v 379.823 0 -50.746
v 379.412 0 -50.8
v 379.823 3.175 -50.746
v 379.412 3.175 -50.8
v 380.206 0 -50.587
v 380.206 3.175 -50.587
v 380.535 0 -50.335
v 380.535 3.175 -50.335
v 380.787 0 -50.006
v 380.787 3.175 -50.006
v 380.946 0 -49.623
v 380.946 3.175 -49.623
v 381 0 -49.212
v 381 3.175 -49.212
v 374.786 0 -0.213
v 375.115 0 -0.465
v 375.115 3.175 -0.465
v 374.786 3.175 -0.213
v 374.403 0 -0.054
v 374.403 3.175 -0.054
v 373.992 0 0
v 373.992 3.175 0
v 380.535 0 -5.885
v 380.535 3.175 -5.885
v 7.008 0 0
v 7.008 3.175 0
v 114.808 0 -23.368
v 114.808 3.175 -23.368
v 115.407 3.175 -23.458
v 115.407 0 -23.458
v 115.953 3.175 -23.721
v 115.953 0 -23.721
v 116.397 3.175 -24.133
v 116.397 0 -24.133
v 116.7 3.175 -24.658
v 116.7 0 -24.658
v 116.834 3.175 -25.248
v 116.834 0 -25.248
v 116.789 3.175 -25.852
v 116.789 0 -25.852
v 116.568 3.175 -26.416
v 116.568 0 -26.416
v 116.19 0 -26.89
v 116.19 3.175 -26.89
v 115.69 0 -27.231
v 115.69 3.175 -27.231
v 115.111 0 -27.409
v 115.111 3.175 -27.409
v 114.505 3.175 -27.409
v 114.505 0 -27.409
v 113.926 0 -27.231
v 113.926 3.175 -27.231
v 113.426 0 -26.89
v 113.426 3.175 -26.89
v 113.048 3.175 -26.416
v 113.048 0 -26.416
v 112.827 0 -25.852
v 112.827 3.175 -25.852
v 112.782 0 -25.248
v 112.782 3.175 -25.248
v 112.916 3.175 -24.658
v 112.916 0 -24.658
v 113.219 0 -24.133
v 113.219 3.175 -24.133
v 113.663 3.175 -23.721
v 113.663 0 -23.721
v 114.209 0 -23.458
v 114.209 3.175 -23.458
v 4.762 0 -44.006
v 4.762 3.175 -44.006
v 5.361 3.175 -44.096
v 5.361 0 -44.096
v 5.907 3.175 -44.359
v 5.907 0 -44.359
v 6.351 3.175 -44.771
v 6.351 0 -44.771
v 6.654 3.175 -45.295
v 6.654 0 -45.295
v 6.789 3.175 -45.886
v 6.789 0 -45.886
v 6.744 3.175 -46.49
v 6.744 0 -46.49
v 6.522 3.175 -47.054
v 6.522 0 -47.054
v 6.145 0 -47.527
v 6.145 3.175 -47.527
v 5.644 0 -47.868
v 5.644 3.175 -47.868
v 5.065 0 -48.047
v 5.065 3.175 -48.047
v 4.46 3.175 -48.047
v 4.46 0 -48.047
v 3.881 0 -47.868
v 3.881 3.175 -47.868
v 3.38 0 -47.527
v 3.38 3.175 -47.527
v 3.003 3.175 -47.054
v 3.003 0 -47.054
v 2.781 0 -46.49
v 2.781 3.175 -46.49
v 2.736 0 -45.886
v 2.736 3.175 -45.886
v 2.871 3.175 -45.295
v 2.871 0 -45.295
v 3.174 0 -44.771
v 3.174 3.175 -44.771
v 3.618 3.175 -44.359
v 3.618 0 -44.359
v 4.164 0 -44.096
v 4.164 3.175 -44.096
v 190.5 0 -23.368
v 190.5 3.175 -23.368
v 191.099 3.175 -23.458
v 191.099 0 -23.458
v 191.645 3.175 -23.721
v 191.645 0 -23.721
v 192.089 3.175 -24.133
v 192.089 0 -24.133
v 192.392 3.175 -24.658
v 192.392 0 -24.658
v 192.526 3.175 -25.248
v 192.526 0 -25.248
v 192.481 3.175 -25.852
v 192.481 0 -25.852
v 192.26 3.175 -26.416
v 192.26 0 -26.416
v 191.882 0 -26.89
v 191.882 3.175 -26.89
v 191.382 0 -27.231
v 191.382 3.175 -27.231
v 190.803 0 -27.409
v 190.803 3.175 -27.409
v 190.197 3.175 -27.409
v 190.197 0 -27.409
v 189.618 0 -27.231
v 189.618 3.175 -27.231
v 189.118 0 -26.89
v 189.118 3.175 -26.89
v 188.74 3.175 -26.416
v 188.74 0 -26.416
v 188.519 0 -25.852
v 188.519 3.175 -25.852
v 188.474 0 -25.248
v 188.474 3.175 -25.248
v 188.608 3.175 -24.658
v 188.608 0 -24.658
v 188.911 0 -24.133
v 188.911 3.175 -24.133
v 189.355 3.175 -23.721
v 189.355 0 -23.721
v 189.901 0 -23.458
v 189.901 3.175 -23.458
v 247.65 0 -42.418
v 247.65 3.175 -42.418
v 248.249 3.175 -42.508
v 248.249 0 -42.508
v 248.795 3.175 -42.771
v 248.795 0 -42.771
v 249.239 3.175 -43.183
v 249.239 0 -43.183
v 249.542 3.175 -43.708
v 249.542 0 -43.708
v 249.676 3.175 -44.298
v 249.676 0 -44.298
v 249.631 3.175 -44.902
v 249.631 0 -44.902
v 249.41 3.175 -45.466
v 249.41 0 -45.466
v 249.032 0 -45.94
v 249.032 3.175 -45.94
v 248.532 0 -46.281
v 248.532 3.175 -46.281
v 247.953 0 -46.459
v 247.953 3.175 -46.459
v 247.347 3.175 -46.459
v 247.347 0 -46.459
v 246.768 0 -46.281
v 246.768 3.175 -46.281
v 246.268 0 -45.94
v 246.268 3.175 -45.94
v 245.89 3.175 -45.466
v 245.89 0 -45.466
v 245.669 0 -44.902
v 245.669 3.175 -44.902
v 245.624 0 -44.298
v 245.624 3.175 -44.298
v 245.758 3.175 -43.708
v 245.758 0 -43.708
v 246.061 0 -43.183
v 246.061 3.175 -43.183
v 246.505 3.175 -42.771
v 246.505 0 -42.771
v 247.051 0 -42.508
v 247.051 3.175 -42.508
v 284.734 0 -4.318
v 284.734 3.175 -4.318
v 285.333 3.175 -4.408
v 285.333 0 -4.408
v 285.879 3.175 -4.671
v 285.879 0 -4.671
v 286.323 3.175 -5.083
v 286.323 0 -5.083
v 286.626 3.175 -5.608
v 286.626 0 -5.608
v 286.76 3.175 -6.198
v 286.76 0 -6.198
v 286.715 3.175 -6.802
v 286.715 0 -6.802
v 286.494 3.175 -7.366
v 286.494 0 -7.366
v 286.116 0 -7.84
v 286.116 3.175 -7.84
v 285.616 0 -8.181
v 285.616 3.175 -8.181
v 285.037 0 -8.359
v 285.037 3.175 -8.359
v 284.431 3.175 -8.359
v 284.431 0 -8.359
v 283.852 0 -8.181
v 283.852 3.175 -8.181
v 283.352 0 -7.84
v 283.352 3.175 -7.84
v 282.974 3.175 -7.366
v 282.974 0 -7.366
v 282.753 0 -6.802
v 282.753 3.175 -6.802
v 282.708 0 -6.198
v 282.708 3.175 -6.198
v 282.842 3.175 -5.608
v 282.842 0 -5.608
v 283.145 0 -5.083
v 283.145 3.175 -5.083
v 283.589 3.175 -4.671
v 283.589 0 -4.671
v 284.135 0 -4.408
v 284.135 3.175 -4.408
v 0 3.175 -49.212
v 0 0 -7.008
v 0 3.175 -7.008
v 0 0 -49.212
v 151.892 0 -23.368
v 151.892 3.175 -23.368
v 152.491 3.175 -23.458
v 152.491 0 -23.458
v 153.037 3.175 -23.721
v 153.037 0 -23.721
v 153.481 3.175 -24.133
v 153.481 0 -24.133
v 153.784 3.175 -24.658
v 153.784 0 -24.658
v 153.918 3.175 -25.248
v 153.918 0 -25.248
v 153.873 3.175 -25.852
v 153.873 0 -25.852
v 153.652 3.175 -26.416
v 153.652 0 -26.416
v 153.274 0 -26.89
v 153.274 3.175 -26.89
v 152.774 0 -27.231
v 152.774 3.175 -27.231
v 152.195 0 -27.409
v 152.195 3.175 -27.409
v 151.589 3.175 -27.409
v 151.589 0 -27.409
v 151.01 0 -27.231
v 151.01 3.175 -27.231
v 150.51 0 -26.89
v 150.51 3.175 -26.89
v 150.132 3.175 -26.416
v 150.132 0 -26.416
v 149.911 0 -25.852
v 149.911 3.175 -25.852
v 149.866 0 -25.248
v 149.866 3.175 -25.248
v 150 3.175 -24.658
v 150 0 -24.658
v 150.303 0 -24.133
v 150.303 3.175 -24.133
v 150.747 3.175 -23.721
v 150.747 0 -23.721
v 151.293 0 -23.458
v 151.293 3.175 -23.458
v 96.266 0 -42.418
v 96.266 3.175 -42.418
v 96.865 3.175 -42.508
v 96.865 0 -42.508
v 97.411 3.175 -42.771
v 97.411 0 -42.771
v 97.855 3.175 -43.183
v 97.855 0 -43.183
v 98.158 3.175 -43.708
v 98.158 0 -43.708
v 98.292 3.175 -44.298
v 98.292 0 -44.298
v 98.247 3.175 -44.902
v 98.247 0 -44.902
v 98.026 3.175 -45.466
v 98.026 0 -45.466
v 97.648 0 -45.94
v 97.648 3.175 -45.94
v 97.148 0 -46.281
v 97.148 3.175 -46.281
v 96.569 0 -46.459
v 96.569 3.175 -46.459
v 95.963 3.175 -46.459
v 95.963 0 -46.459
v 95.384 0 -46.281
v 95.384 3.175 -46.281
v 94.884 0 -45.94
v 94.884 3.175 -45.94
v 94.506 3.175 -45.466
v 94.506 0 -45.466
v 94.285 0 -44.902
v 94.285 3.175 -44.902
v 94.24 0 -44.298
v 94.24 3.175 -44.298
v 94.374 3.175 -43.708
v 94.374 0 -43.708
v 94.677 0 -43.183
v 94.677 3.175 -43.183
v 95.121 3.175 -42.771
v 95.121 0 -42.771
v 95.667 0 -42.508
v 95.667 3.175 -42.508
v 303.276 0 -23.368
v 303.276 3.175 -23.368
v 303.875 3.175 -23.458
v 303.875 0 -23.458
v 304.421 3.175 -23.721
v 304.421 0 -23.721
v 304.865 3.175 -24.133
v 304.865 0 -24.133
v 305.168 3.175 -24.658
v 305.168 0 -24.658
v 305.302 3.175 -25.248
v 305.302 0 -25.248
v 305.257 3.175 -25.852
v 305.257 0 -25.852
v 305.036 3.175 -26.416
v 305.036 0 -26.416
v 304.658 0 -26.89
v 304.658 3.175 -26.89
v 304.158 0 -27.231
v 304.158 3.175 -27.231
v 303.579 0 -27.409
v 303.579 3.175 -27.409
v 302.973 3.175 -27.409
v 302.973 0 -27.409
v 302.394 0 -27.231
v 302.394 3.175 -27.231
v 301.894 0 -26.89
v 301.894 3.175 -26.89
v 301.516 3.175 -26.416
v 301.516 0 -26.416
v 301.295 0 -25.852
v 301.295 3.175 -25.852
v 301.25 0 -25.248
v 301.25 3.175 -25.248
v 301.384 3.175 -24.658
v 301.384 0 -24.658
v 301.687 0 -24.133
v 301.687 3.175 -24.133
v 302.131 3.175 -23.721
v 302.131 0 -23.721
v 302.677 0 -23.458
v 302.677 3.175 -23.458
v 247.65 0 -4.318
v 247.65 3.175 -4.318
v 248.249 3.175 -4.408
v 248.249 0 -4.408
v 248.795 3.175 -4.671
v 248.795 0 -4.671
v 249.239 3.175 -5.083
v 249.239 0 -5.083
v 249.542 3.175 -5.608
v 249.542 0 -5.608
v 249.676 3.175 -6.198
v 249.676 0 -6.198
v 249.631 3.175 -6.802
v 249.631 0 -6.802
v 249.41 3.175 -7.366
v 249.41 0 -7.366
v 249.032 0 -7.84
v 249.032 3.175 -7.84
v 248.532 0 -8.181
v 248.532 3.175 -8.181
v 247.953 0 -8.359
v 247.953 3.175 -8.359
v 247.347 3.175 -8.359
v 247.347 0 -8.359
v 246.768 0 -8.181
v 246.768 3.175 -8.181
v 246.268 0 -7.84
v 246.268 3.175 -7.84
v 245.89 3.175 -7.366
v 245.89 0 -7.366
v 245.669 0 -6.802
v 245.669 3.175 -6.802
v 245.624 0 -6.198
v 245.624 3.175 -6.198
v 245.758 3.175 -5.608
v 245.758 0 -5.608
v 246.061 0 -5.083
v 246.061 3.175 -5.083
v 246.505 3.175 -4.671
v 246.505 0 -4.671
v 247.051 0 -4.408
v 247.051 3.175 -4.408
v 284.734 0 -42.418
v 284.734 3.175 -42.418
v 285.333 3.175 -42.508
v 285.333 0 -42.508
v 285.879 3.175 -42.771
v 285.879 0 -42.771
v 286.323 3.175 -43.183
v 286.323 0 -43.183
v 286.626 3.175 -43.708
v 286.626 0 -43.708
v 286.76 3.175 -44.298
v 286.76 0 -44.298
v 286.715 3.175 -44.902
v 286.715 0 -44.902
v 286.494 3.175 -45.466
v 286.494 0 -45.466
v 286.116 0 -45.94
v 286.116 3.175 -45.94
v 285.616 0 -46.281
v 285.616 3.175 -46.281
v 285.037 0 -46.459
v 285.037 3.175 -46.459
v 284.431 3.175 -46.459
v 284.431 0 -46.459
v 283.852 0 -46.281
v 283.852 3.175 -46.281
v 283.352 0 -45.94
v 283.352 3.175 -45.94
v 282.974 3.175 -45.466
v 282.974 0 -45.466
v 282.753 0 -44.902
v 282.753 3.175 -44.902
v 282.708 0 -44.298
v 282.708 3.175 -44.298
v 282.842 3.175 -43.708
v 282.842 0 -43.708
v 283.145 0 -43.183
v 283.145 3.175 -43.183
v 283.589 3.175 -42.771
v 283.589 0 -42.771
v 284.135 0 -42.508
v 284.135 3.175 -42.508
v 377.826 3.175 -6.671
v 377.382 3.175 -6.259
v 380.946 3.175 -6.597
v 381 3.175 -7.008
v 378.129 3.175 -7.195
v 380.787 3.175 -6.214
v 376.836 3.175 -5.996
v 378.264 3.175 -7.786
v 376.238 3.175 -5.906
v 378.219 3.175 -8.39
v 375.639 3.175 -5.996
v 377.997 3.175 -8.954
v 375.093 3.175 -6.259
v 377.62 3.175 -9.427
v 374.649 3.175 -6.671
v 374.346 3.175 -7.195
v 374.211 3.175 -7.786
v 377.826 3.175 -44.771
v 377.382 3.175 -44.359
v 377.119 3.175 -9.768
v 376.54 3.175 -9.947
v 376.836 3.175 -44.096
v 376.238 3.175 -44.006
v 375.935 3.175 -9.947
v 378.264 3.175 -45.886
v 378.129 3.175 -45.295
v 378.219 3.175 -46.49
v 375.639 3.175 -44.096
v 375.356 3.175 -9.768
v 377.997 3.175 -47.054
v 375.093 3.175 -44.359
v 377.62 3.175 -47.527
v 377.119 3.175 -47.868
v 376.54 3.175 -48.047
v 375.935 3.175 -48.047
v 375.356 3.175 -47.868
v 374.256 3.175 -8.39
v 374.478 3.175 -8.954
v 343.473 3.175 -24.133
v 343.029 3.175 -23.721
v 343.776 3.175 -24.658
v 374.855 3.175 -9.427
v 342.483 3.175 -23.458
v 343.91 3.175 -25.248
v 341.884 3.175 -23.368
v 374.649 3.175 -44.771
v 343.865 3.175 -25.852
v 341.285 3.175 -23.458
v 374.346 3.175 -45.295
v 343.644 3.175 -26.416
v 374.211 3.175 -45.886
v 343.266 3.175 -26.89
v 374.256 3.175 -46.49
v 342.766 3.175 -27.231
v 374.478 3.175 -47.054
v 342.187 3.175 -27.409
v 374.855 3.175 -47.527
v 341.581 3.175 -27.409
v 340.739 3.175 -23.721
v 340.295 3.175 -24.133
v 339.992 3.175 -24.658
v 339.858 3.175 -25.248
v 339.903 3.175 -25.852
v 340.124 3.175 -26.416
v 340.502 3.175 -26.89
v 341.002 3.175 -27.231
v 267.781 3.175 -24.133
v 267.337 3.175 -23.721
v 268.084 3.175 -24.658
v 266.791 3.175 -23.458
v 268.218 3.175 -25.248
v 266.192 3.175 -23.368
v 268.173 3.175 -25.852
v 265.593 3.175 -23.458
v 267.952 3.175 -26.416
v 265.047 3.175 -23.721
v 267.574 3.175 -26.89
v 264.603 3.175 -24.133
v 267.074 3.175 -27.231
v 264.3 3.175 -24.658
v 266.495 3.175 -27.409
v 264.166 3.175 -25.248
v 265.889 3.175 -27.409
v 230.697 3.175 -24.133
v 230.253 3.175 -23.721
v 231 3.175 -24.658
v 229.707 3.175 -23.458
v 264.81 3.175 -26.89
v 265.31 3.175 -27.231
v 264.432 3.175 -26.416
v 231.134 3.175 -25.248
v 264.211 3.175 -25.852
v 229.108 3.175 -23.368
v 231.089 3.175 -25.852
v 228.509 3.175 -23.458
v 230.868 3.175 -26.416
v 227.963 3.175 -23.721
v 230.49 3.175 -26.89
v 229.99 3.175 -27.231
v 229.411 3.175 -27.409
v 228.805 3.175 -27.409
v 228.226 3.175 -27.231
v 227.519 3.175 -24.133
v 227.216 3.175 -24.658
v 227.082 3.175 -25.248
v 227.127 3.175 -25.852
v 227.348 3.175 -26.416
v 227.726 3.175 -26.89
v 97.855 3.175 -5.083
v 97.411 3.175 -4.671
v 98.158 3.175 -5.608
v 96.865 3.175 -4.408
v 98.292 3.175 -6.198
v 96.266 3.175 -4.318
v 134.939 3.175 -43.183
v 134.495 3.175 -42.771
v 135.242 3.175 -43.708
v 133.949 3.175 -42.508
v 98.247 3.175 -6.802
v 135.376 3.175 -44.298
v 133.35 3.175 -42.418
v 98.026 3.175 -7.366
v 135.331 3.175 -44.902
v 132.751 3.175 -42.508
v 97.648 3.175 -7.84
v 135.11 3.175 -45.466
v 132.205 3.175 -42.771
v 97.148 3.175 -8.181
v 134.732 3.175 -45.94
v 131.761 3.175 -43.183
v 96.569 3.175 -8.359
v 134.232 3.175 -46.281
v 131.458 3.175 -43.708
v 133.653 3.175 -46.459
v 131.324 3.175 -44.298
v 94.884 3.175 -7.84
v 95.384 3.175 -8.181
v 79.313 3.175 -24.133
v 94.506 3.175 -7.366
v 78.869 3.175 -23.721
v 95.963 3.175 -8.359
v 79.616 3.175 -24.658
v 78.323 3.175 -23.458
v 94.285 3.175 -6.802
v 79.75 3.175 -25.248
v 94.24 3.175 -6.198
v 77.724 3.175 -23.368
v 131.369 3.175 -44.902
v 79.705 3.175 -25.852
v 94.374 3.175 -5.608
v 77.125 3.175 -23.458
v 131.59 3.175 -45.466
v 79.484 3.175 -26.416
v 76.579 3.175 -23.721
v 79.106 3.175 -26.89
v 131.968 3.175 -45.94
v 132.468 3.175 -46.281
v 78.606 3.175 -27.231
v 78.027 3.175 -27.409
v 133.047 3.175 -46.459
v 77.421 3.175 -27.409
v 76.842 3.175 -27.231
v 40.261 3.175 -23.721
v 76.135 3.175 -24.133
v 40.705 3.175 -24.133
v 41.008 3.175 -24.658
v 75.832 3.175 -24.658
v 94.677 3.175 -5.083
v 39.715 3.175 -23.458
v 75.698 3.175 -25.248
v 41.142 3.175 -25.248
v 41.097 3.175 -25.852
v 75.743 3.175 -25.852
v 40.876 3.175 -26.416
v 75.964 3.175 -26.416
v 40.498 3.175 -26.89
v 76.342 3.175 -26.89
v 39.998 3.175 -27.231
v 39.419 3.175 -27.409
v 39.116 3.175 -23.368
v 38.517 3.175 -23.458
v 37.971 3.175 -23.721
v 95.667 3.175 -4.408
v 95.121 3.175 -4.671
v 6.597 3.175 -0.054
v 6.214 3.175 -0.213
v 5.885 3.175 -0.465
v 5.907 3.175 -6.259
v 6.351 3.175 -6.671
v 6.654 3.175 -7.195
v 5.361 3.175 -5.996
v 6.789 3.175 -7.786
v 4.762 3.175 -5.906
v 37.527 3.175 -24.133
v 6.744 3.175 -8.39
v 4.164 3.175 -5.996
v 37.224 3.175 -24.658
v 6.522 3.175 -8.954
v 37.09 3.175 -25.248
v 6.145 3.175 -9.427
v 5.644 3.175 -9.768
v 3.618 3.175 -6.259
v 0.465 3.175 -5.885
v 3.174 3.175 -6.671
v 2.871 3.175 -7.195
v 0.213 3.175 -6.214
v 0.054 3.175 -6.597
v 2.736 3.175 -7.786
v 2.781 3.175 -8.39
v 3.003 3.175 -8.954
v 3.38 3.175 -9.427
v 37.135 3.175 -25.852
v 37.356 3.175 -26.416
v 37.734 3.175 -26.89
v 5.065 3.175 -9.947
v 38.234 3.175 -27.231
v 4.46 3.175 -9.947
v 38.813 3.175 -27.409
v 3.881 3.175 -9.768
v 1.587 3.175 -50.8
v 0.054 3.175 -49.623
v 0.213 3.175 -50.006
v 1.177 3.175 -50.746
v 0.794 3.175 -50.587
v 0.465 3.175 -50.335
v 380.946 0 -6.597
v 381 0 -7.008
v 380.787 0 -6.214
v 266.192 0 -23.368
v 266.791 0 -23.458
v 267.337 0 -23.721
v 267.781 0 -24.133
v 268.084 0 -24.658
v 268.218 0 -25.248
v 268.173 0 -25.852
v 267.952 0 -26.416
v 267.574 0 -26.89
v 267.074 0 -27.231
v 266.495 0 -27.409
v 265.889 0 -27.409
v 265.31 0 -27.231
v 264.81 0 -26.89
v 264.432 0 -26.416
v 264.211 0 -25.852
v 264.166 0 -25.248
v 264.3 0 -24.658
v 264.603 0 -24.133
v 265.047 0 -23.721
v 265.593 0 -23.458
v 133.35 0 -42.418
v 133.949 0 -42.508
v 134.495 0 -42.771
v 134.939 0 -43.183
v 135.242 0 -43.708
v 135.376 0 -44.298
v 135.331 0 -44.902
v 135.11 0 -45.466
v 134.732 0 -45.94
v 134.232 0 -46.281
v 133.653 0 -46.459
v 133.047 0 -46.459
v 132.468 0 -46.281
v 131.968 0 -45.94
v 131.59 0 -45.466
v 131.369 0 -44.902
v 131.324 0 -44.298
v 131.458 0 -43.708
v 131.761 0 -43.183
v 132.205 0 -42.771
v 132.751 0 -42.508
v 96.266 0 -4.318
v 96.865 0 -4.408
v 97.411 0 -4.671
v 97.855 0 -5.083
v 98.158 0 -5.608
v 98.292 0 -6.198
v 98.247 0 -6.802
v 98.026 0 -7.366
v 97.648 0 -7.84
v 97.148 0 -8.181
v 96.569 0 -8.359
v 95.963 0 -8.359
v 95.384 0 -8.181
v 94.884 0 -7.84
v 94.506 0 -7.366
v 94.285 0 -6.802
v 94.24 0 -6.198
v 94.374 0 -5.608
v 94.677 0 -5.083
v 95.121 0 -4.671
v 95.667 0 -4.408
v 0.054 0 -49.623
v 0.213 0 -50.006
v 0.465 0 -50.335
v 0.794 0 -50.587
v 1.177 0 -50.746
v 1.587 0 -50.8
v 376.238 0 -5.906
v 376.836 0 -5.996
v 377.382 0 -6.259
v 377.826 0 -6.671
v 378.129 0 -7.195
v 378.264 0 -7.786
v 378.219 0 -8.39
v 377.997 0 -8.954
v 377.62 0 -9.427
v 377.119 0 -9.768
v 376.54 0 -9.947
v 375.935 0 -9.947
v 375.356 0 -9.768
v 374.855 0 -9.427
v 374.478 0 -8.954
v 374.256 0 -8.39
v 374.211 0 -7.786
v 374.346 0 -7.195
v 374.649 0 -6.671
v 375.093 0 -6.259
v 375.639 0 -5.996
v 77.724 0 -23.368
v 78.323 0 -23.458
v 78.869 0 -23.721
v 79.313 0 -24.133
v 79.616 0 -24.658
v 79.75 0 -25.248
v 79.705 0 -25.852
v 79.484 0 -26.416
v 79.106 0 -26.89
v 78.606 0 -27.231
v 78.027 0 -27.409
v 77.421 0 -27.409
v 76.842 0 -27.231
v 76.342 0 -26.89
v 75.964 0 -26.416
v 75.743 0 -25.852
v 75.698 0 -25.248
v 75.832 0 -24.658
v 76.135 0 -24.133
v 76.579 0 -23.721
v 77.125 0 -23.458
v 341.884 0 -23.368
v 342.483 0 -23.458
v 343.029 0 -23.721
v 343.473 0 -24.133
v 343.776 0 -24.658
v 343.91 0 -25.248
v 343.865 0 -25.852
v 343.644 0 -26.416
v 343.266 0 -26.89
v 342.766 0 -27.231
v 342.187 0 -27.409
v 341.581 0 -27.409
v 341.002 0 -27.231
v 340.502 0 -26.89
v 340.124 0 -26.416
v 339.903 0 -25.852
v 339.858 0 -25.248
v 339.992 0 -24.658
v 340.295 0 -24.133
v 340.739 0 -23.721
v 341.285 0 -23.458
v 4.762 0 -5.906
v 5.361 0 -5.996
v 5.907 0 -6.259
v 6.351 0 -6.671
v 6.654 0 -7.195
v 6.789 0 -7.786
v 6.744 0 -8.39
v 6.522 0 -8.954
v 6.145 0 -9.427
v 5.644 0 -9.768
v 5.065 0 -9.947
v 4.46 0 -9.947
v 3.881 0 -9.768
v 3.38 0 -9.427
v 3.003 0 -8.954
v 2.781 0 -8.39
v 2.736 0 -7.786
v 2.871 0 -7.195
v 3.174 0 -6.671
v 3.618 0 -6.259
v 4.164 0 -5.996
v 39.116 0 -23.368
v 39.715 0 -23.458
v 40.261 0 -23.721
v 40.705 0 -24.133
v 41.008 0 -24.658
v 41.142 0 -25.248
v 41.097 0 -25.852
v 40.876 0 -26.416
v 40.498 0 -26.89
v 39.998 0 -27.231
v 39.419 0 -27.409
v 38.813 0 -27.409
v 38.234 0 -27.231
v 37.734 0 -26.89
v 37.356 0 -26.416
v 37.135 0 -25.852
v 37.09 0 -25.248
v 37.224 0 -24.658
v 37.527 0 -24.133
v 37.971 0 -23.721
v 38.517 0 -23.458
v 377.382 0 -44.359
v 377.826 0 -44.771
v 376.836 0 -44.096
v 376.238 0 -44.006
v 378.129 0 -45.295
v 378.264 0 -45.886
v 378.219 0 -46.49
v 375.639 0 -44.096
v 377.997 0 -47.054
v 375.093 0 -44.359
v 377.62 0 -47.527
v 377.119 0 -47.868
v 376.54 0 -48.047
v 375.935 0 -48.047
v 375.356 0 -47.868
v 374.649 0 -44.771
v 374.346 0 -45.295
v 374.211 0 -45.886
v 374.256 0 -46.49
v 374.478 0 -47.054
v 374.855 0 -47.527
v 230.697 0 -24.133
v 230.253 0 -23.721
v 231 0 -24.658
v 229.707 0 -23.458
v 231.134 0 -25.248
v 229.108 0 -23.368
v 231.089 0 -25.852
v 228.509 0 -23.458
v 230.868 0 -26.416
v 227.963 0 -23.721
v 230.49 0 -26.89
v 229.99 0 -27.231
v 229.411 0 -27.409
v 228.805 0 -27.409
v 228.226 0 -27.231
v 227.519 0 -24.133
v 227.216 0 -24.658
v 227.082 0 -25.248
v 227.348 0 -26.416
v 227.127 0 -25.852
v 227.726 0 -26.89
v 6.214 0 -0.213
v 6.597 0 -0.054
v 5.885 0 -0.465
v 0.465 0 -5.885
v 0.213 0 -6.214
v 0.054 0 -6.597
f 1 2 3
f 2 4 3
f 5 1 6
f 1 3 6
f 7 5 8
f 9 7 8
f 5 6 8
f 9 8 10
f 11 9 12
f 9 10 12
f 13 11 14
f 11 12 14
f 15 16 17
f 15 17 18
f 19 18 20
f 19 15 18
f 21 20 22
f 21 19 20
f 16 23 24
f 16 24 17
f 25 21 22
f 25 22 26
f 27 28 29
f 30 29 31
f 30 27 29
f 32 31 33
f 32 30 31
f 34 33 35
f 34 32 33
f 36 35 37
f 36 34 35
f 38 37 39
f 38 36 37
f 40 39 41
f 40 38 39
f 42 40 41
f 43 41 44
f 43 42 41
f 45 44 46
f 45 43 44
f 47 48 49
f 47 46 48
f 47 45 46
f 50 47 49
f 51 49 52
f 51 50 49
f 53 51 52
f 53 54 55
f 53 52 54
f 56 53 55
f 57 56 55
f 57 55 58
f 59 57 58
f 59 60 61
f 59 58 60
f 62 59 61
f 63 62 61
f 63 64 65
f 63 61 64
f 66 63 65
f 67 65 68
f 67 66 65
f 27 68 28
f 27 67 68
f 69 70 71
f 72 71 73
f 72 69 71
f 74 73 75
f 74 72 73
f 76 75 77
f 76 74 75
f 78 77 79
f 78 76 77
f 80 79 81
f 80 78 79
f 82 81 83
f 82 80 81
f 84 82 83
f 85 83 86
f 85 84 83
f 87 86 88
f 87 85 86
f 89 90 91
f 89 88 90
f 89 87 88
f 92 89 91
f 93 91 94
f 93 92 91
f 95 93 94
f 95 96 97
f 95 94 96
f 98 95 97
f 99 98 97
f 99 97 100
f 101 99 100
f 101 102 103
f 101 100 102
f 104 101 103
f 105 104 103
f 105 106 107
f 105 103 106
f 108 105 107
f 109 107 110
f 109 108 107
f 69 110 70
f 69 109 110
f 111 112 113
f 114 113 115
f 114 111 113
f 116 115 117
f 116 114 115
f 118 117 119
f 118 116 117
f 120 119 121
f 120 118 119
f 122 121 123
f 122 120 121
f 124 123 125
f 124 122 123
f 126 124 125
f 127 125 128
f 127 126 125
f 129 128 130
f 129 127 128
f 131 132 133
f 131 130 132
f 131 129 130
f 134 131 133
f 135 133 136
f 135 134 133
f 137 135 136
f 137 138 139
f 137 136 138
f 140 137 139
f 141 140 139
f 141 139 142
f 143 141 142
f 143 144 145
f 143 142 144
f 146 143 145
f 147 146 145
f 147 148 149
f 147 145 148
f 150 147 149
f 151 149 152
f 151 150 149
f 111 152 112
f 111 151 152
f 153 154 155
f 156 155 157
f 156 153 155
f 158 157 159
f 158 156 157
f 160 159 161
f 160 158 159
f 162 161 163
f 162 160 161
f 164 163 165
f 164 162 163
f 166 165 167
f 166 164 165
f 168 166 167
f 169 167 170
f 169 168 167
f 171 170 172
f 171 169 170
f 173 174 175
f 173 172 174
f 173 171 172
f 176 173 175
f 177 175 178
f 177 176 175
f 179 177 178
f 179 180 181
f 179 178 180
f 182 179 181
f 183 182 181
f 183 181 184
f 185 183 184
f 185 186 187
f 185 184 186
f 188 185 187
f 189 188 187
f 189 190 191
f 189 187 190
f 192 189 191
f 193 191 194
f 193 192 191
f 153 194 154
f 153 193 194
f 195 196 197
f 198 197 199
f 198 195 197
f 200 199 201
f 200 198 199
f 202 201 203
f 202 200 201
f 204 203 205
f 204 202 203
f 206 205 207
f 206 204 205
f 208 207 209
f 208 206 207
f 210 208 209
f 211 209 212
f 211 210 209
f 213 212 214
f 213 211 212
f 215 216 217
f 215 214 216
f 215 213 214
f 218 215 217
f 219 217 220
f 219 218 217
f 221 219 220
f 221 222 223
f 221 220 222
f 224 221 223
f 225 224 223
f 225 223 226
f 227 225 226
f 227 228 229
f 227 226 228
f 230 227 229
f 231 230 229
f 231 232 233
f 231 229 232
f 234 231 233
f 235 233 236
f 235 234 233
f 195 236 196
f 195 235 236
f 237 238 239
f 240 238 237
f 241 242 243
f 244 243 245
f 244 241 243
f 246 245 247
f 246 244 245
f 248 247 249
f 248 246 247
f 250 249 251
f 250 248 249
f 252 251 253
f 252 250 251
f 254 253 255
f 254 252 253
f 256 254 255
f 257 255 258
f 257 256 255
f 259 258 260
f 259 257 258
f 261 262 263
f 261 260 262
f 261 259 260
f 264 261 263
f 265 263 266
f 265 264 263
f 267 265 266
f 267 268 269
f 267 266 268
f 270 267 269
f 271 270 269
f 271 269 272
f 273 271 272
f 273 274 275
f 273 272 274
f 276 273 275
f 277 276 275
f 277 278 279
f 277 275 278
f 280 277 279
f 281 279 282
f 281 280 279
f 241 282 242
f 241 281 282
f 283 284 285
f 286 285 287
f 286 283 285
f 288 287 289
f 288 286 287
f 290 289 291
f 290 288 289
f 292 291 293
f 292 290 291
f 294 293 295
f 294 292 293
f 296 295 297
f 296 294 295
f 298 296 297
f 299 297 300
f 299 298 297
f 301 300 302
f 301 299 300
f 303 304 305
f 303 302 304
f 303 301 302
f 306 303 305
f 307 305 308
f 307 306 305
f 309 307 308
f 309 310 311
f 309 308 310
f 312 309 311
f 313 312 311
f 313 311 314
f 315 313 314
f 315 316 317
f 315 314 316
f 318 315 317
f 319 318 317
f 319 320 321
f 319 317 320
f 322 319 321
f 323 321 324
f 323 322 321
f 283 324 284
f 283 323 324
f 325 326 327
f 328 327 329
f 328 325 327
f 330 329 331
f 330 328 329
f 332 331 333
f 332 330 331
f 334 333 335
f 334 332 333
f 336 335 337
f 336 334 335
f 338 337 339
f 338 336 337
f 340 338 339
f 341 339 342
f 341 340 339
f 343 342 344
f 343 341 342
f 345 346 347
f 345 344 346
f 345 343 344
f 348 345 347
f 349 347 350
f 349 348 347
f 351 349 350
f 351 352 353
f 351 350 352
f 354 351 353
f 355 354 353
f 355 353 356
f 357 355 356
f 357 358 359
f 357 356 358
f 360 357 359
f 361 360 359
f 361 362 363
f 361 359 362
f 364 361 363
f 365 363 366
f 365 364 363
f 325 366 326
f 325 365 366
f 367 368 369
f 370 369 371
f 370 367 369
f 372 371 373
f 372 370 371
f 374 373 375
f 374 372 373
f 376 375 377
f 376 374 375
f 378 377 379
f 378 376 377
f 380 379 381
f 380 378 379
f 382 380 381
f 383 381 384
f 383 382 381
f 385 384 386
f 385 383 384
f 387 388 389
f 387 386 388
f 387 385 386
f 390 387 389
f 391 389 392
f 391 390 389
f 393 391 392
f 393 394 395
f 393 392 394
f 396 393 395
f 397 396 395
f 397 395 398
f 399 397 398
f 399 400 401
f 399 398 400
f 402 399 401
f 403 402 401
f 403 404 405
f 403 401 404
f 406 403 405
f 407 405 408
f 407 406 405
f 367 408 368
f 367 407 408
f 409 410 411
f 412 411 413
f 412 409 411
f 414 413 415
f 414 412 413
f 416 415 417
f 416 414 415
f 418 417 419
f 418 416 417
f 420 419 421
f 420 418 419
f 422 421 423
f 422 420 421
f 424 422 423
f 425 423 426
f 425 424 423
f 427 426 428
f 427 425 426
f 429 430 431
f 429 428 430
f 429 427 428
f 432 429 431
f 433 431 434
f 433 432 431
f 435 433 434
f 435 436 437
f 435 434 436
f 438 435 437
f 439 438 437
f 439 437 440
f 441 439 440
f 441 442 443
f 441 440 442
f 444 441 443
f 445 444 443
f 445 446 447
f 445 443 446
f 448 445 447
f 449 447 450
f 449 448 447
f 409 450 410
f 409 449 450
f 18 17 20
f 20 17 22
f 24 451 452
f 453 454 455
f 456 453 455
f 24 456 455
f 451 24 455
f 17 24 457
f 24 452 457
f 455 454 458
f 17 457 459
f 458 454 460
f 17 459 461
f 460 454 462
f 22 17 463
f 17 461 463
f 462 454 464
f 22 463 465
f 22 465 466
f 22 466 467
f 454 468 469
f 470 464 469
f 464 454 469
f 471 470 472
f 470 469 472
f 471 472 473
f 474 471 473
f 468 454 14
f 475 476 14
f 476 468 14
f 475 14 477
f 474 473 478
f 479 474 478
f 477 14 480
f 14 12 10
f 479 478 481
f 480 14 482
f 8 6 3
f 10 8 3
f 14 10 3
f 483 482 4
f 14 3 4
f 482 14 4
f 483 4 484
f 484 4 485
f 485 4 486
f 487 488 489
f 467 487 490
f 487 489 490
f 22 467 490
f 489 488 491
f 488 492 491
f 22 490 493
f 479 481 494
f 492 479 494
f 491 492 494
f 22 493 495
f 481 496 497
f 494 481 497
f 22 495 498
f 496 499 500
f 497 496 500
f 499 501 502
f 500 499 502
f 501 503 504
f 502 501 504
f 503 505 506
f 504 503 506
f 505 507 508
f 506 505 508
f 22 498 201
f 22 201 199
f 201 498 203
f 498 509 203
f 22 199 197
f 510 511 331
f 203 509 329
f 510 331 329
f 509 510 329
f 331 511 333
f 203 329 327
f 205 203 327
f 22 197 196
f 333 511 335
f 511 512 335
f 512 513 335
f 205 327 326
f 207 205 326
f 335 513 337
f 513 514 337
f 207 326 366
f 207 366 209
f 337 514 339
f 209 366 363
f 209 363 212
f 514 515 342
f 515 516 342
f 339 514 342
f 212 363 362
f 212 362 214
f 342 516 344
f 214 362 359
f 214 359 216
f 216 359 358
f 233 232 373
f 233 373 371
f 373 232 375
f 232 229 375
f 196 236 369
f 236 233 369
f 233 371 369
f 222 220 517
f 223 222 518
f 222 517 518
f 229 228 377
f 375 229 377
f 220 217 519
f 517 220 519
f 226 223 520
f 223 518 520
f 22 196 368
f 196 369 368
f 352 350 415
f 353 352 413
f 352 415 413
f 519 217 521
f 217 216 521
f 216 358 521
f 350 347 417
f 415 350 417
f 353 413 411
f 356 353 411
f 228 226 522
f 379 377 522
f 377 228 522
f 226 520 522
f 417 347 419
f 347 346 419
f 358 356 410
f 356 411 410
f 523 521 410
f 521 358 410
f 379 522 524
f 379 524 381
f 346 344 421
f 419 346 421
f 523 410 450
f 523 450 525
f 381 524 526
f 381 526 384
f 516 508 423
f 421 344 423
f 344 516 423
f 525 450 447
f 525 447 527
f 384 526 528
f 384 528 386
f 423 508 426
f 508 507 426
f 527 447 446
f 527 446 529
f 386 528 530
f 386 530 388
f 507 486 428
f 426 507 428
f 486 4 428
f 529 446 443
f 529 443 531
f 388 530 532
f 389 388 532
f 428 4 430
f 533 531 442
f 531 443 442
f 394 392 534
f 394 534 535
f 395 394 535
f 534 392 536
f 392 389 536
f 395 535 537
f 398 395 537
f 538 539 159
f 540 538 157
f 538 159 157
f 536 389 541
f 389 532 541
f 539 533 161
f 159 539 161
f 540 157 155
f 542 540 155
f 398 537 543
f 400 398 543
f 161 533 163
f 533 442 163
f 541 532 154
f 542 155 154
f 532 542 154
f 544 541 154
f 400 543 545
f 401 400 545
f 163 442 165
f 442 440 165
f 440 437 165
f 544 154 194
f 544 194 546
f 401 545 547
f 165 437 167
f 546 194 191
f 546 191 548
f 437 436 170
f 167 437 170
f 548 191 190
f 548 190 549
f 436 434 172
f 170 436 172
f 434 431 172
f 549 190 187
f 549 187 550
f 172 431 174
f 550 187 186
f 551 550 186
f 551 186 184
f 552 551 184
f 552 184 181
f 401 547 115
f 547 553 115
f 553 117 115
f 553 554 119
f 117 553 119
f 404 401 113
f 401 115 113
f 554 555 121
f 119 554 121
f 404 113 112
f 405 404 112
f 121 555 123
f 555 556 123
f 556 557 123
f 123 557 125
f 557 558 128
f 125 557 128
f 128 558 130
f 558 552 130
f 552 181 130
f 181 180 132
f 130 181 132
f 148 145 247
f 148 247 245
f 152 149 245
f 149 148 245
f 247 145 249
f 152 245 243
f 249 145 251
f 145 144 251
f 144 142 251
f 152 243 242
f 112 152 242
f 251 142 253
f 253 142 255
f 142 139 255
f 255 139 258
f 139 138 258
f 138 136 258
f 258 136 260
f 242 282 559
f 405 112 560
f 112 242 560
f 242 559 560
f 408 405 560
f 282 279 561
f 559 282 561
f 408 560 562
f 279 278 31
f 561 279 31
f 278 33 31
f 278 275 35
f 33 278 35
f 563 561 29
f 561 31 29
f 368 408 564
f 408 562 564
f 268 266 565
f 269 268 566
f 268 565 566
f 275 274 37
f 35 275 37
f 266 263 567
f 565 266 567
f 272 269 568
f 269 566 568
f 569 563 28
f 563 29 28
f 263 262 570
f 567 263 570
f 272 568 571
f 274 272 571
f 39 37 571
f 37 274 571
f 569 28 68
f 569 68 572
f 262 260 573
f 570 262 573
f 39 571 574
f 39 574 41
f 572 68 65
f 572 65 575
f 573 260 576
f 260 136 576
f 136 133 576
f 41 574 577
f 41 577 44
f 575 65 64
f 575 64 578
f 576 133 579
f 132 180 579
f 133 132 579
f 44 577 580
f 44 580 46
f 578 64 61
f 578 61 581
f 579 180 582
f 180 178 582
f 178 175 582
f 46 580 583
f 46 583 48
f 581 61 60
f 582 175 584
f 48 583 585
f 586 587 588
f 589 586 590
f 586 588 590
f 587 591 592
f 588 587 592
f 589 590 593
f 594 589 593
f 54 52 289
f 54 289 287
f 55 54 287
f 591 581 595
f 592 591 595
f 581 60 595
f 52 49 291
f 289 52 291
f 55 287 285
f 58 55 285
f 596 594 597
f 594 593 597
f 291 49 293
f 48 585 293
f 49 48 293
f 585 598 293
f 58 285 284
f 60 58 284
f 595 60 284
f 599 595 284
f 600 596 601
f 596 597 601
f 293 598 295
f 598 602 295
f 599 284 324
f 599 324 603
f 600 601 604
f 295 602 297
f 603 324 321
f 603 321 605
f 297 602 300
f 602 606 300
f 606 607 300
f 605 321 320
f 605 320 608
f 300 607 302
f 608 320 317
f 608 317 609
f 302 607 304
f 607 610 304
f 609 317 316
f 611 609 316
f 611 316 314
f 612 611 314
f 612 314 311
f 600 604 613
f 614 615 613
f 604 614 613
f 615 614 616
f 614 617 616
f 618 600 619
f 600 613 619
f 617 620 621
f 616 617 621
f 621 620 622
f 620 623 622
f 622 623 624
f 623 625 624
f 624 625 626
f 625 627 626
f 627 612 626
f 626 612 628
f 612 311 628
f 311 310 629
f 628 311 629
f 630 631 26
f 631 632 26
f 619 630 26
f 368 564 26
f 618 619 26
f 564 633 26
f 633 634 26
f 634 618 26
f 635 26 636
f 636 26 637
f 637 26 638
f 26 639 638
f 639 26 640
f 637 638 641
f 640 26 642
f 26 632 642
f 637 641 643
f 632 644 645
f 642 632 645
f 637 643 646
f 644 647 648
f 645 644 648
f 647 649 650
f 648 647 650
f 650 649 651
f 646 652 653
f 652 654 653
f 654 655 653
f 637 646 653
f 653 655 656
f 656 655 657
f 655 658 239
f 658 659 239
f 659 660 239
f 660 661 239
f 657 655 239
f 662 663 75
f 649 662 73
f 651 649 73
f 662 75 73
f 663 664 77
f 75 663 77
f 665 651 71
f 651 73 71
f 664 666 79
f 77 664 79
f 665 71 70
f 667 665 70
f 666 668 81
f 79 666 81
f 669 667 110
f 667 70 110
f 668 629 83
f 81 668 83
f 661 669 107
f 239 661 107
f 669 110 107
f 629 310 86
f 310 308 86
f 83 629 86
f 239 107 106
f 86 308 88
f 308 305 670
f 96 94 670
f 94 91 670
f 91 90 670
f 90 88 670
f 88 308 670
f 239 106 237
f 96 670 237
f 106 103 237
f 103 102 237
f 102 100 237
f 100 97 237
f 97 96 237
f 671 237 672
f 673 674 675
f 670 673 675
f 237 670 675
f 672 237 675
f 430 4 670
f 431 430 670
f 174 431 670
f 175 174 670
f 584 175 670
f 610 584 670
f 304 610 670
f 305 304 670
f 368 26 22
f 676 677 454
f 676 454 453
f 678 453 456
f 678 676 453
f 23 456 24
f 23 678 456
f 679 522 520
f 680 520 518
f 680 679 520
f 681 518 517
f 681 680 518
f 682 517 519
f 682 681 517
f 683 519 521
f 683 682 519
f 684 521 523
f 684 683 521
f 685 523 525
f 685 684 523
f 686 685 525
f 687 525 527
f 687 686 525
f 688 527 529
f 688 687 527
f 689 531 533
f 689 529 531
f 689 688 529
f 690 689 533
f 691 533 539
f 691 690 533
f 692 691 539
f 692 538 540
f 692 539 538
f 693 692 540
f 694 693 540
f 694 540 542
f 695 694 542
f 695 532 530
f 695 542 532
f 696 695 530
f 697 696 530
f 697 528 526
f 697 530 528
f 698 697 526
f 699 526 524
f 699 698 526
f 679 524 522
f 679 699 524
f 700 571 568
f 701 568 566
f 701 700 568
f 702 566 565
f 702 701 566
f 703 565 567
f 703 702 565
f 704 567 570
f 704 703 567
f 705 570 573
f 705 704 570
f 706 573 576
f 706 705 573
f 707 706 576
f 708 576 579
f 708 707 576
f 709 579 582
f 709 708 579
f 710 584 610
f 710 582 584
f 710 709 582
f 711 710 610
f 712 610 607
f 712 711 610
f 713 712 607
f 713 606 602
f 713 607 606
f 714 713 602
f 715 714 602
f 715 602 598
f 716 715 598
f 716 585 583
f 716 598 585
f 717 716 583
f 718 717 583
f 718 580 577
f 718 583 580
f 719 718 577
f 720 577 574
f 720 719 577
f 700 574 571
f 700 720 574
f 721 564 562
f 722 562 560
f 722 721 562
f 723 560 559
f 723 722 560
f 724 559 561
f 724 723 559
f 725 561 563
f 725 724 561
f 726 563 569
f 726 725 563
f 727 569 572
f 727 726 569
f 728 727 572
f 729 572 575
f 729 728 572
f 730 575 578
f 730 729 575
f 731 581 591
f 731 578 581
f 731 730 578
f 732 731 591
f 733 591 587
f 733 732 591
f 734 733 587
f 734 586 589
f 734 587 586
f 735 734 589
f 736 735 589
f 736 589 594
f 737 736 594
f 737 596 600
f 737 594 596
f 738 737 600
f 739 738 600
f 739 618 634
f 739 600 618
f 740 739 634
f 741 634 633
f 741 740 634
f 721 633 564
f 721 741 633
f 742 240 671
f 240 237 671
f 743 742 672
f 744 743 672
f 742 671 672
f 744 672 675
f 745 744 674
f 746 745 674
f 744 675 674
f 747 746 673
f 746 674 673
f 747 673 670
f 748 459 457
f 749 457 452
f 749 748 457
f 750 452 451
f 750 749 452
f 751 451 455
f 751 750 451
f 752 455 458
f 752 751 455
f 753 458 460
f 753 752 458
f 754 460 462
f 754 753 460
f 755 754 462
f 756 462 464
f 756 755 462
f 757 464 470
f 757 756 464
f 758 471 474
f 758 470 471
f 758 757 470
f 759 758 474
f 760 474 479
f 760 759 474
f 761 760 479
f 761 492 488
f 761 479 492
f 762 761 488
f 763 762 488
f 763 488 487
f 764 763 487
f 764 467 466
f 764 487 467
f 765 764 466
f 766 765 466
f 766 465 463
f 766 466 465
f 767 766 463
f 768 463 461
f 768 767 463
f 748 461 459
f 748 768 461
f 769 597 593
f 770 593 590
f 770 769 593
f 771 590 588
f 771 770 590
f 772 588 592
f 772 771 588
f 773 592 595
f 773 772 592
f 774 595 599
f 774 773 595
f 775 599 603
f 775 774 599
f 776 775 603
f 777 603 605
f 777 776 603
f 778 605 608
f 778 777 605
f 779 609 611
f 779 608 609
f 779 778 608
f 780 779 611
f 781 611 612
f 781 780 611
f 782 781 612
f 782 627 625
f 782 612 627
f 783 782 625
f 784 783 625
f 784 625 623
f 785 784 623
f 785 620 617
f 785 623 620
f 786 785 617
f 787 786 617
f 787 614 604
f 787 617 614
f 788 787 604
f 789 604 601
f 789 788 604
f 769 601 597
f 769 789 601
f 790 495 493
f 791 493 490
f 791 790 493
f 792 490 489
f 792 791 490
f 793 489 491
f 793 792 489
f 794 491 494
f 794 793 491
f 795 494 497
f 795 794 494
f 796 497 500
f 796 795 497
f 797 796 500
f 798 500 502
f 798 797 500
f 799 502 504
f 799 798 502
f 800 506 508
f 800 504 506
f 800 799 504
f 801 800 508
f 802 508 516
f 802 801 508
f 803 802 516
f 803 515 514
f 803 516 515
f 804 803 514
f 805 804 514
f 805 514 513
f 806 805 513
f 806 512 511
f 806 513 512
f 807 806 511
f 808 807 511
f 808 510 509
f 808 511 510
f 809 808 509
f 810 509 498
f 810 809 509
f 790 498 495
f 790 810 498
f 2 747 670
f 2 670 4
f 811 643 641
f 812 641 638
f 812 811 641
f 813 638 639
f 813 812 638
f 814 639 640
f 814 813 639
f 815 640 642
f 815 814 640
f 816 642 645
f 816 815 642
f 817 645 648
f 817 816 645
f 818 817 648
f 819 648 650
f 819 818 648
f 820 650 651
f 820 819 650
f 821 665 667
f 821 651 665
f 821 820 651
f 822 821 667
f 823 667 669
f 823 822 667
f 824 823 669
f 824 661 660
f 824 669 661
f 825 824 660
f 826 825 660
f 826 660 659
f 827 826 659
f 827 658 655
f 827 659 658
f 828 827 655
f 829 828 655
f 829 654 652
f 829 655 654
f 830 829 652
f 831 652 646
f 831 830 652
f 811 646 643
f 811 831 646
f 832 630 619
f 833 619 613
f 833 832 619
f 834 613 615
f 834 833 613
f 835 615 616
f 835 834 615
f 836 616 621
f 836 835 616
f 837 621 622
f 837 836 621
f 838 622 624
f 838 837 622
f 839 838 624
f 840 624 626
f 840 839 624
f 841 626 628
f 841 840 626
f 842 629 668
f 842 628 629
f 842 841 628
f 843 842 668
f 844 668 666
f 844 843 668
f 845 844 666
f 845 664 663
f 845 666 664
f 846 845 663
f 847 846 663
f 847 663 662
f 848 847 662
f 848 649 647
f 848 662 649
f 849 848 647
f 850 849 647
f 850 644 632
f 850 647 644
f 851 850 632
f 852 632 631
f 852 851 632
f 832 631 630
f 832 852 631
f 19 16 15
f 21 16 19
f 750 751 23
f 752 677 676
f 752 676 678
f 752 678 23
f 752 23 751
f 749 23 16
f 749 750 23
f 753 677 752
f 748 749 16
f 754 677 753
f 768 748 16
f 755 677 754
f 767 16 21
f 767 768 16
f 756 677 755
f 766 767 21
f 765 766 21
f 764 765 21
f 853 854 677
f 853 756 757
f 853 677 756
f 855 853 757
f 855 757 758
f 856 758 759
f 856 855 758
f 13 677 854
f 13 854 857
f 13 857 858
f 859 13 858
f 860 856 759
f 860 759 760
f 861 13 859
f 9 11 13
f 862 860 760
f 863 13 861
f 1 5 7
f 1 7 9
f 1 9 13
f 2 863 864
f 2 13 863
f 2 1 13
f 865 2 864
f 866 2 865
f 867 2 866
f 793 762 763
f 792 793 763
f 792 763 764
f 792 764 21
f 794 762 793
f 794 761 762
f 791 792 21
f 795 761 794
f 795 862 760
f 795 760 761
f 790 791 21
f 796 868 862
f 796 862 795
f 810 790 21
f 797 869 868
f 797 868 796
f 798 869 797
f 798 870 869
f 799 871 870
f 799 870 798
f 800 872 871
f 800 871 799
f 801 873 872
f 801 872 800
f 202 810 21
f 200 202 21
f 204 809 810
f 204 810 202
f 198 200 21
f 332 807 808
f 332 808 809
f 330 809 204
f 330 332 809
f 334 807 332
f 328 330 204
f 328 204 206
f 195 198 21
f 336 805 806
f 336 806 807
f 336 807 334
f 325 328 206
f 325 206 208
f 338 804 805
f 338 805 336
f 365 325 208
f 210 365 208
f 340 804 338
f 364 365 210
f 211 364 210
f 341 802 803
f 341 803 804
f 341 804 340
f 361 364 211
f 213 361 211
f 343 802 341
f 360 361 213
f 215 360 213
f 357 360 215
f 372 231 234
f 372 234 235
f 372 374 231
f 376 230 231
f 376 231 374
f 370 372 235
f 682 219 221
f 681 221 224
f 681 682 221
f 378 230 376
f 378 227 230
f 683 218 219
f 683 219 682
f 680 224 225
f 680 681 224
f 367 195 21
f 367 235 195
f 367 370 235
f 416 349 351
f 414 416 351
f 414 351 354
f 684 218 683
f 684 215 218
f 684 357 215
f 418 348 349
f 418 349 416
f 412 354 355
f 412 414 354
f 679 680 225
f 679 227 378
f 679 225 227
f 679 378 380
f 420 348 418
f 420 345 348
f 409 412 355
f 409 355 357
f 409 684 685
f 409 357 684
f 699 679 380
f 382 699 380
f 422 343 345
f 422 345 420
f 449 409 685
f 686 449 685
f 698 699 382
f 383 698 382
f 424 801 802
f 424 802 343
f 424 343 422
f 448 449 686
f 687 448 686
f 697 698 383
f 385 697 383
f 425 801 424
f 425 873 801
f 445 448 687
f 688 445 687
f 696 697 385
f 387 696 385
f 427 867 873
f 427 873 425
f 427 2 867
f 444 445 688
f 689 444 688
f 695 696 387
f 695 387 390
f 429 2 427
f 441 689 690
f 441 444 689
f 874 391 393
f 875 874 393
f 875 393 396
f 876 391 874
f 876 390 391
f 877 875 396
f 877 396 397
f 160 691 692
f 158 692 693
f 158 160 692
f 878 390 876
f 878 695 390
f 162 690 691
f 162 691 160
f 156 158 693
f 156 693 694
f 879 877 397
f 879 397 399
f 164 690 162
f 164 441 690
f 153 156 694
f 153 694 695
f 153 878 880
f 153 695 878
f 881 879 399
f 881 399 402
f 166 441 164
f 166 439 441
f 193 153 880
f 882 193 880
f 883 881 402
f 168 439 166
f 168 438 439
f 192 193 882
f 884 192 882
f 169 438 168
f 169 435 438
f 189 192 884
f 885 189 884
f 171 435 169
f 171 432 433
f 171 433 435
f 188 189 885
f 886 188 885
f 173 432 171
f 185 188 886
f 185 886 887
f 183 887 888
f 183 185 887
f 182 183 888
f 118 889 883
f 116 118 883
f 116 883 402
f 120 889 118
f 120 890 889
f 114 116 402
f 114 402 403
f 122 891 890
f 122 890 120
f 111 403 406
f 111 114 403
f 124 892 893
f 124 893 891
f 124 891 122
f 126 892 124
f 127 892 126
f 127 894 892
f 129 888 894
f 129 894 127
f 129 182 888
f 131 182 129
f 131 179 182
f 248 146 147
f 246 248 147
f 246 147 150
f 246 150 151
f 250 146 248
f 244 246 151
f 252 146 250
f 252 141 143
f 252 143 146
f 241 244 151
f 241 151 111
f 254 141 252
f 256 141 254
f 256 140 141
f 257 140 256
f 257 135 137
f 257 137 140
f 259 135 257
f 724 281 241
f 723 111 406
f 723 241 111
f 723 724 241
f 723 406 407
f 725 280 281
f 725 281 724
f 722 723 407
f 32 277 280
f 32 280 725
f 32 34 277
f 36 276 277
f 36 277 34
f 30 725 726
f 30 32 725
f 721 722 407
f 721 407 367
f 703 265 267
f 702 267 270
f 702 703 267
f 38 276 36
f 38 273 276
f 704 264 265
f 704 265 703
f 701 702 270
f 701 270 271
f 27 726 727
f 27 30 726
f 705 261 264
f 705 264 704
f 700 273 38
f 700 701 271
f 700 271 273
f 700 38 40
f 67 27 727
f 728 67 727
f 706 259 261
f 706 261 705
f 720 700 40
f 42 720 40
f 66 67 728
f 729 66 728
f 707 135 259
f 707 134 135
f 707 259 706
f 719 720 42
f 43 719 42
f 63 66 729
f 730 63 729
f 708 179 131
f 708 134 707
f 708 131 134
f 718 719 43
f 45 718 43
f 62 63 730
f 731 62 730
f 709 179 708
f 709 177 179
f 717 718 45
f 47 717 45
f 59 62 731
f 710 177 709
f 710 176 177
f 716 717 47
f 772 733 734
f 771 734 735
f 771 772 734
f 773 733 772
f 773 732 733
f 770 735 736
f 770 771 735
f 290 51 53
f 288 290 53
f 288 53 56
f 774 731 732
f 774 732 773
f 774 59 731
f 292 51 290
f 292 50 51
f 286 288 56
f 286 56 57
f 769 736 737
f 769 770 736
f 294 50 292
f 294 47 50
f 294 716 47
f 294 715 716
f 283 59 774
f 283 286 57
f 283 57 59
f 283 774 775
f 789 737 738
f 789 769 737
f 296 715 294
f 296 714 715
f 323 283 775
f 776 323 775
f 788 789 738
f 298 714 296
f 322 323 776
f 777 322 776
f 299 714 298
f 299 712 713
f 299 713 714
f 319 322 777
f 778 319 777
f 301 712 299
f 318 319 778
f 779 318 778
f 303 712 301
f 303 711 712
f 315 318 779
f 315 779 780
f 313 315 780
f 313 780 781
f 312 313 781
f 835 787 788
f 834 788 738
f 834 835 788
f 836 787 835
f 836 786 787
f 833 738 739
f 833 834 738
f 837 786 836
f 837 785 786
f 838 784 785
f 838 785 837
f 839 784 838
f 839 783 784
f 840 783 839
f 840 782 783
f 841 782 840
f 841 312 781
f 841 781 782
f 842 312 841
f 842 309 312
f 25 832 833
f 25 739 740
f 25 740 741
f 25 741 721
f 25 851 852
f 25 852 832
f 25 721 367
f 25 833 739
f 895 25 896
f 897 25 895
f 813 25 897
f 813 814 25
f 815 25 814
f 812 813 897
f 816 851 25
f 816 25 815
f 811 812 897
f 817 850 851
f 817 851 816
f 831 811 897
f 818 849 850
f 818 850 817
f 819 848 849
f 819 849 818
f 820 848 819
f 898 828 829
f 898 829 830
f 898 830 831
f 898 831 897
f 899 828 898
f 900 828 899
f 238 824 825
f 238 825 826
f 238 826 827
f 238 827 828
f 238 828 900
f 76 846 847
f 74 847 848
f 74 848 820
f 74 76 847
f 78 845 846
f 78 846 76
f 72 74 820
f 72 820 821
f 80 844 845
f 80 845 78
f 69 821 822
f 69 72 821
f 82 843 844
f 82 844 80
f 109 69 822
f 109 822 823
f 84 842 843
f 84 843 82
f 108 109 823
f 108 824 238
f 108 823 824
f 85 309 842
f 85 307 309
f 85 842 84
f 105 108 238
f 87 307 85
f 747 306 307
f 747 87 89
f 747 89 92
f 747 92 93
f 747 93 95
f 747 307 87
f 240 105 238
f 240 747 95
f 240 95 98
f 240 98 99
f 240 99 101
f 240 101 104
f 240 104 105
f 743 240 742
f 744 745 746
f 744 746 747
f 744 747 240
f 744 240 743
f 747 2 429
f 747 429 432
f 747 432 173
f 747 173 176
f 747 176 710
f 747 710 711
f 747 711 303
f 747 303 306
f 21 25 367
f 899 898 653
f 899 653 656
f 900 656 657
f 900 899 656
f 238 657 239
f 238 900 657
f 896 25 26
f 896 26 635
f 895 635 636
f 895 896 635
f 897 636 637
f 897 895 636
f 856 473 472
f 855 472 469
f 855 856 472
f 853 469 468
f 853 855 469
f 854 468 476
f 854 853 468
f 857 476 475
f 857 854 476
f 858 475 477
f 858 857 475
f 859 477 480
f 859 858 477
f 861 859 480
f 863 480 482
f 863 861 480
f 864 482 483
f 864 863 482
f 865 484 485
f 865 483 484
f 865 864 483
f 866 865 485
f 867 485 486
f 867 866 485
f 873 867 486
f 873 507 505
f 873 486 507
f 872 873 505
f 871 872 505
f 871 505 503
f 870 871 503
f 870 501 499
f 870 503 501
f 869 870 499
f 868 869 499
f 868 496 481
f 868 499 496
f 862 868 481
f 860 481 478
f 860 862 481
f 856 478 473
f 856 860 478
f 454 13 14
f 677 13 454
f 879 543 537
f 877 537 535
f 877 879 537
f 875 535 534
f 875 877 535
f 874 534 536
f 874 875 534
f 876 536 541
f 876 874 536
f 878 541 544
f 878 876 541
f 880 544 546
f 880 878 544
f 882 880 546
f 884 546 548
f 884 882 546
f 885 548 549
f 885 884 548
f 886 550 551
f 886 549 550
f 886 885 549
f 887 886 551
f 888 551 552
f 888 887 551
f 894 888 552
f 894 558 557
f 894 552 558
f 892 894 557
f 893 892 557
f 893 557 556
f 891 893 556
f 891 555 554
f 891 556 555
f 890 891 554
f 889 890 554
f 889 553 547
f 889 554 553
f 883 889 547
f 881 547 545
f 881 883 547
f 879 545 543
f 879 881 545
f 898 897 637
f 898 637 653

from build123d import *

# Parameters (mm, degrees)
BOSS_EXTRUDE1_DEPTH = 3.175
SKETCH3_R           = 2.032
CUT_EXTRUDE1_DEPTH  = 385.384860036
FILLET1_R           = 1.5875


with BuildPart() as part:
    # Sketch2 → Boss-Extrude1 (new body)
    with BuildSketch(Plane(origin=(0, 0, 0), x_dir=(1, 0, 0), z_dir=(0, 1, 0))):
        with BuildLine():
            Line((0, 7.00756403), (0, 50.8))
            Line((0, 50.8), (381, 50.8))
            Line((381, 50.8), (381, 7.00756403))
            ThreePointArc((381, 7.00756403), (380.879158758, 6.400054081), (380.535032015, 5.885032015))
            Line((380.535032015, 5.885032015), (375.114967985, 0.464967985))
            ThreePointArc((375.114967985, 0.464967985), (374.599945919, 0.120841242), (373.99243597, 0))
            Line((373.99243597, 0), (7.00756403, 0))
            ThreePointArc((7.00756403, 0), (6.400054081, 0.120841242), (5.885032015, 0.464967985))
            Line((5.885032015, 0.464967985), (0.464967985, 5.885032015))
            ThreePointArc((0.464967985, 5.885032015), (0.120841242, 6.400054081), (0, 7.00756403))
        make_face()
    extrude(amount=BOSS_EXTRUDE1_DEPTH)

    # Sketch3 → Cut-Extrude1 (cut, through all)
    with BuildSketch(Plane(origin=(0, 0, 0), x_dir=(1, 0, 0), z_dir=(0, 1, 0))):
        with Locations(Location((4.7625, 7.9375, 0), (0, 0, 270))):
            Circle(SKETCH3_R)
        with Locations(Location((4.7625, 46.0375, 0), (0, 0, 270))):
            Circle(SKETCH3_R)
        with Locations(Location((376.2375, 7.9375, 0), (0, 0, 270))):
            Circle(SKETCH3_R)
        with Locations(Location((376.2375, 46.0375, 0), (0, 0, 270))):
            Circle(SKETCH3_R)
        with Locations(Location((341.884, 25.4, 0), (0, 0, 270))):
            Circle(SKETCH3_R)
        with Locations(Location((247.65, 44.45, 0), (0, 0, 270))):
            Circle(SKETCH3_R)
        with Locations(Location((284.734, 44.45, 0), (0, 0, 270))):
            Circle(SKETCH3_R)
        with Locations(Location((247.65, 6.35, 0), (0, 0, 270))):
            Circle(SKETCH3_R)
        with Locations(Location((284.734, 6.35, 0), (0, 0, 270))):
            Circle(SKETCH3_R)
        with Locations(Location((190.5, 25.4, 0), (0, 0, 270))):
            Circle(SKETCH3_R)
        with Locations(Location((133.35, 44.45, 0), (0, 0, 270))):
            Circle(SKETCH3_R)
        with Locations(Location((96.266, 44.45, 0), (0, 0, 270))):
            Circle(SKETCH3_R)
        with Locations(Location((96.266, 6.35, 0), (0, 0, 270))):
            Circle(SKETCH3_R)
        with Locations(Location((77.724, 25.4, 0), (0, 0, 270))):
            Circle(SKETCH3_R)
        with Locations(Location((39.116, 25.4, 0), (0, 0, 270))):
            Circle(SKETCH3_R)
        with Locations(Location((151.892, 25.4, 0), (0, 0, 270))):
            Circle(SKETCH3_R)
        with Locations(Location((229.108, 25.4, 0), (0, 0, 270))):
            Circle(SKETCH3_R)
        with Locations(Location((266.192, 25.4, 0), (0, 0, 270))):
            Circle(SKETCH3_R)
        with Locations(Location((303.276, 25.4, 0), (0, 0, 270))):
            Circle(SKETCH3_R)
        with Locations(Location((114.808, 25.4, 0), (0, 0, 270))):
            Circle(SKETCH3_R)
    extrude(amount=CUT_EXTRUDE1_DEPTH, mode=Mode.SUBTRACT)

    # Fillet1
    fillet1_edges = [part.edges().sort_by_distance(p)[0] for p in [
        (381, 1.5875, -50.8),
        (0, 1.5875, -50.8),
    ]]
    fillet(fillet1_edges, radius=FILLET1_R)


solid = part.part
